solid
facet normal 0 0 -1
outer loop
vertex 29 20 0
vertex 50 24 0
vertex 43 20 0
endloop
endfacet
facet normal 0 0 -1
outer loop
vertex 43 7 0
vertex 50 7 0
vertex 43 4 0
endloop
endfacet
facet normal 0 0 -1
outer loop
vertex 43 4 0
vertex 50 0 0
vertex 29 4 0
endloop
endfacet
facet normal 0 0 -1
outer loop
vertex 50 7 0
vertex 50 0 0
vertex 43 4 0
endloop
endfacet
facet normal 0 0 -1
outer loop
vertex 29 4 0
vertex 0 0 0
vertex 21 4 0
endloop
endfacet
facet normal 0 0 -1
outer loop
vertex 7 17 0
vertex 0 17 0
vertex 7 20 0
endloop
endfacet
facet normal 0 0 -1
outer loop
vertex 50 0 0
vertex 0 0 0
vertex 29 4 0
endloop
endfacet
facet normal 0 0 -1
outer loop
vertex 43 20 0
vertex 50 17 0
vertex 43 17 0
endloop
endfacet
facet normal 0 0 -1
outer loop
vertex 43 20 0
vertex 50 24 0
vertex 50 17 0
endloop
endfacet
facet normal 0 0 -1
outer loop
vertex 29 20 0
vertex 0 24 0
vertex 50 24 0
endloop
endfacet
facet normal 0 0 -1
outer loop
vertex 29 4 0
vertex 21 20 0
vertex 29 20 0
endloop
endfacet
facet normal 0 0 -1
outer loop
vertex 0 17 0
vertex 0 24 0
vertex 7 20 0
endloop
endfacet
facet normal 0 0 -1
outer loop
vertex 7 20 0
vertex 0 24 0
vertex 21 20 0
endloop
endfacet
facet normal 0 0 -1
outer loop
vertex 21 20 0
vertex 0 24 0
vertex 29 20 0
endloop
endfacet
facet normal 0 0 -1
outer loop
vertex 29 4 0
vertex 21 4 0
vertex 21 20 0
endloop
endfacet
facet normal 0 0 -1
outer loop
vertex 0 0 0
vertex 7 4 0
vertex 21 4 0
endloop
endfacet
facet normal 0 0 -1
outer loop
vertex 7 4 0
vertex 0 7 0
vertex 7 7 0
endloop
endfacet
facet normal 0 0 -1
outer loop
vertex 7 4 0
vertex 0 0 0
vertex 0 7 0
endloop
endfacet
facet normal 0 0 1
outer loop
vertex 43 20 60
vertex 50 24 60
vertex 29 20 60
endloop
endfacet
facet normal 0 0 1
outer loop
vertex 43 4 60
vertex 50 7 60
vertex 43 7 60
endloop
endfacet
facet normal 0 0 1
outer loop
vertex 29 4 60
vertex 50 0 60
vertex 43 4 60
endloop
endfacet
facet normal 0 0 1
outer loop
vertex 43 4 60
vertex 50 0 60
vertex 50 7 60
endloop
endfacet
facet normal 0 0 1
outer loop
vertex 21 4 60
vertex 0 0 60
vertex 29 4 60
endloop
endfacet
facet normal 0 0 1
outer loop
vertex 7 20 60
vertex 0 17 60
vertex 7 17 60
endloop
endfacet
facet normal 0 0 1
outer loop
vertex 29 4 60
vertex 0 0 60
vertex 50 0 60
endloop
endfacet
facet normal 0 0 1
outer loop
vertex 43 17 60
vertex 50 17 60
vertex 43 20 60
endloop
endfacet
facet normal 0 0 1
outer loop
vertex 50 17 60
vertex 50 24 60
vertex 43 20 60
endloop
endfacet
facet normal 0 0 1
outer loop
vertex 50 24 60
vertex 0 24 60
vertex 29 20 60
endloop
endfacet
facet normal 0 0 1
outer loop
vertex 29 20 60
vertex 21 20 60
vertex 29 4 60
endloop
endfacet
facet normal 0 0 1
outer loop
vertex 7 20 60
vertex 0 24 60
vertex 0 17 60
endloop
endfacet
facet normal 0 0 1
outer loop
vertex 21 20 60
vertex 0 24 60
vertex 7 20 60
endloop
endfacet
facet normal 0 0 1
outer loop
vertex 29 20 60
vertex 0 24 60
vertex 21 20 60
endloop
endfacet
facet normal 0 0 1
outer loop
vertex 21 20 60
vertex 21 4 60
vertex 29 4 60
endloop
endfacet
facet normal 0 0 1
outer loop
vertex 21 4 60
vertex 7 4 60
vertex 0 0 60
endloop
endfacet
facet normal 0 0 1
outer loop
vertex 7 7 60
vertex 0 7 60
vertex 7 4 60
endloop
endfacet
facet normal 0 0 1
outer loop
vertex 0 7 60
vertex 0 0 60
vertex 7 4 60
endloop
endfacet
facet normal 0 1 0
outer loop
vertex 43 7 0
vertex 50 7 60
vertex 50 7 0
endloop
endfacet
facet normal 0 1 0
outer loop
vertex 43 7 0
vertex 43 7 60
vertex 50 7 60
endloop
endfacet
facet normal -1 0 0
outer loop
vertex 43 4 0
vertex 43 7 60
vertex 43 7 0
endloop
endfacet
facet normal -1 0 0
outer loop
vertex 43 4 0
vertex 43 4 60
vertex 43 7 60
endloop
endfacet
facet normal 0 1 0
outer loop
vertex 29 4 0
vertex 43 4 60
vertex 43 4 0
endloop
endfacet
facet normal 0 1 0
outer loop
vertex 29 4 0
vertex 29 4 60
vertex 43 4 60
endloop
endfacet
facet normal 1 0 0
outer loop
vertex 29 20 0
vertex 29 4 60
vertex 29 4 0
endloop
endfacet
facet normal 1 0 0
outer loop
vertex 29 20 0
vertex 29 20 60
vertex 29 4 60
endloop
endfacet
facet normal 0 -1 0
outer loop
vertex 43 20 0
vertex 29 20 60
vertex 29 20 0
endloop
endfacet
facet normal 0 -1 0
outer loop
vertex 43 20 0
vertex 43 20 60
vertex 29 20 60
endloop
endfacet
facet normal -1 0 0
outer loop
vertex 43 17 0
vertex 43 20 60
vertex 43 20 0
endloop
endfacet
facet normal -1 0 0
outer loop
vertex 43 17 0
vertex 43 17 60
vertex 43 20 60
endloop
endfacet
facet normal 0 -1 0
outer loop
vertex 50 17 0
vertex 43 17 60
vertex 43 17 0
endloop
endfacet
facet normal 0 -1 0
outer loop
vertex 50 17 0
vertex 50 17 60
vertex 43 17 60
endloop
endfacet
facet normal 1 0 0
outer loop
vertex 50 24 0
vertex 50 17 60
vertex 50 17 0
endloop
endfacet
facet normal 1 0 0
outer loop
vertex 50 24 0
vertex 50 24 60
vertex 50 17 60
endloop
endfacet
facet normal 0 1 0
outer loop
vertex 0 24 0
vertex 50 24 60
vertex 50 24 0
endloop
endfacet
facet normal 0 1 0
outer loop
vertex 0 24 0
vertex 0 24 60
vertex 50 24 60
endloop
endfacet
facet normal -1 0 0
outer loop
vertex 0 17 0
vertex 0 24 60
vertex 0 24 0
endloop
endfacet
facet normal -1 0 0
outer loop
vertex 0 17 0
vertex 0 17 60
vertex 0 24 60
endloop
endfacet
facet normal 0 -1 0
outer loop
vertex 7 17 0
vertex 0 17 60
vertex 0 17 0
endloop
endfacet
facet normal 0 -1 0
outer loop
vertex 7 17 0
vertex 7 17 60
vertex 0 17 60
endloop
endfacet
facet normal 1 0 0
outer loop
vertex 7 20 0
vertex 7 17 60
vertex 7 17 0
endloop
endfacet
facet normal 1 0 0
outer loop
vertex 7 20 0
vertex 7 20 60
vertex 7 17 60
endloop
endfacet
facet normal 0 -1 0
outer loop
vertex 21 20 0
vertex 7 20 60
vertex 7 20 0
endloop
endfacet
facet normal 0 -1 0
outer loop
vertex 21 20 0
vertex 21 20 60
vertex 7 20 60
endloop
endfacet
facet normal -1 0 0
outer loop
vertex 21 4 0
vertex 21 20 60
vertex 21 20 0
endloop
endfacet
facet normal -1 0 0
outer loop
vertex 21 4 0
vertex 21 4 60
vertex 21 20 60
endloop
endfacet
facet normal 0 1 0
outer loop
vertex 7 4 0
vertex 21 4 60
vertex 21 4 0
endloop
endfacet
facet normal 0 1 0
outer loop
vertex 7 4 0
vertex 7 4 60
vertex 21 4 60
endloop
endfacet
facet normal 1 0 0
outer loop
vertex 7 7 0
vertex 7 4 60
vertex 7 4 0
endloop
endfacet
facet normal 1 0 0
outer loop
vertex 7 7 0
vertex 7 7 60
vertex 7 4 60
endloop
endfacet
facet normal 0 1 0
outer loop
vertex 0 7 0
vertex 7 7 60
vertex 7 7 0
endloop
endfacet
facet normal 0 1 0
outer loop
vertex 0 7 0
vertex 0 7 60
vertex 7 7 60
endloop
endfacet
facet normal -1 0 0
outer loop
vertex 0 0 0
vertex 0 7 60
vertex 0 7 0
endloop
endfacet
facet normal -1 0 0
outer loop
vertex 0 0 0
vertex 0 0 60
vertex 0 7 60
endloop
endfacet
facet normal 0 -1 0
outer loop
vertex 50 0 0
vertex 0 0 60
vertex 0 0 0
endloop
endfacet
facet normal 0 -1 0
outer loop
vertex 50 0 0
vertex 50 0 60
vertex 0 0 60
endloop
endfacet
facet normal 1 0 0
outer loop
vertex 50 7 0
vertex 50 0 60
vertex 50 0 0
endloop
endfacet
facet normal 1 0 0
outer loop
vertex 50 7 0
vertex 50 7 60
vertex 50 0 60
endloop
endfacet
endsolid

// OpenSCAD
$fn = 32;

// ----------------------------------------------------------------------
// T-slot rail: 50 x 24 mm section, 60 mm long
// ----------------------------------------------------------------------

// --- parameters (mm) ---
profile_height = 60;      // extrusion height
profile_points = 20;      // points of the closed outline

profile = [[0, 0], [50, 0], [50, 7], [43, 7], [43, 4], [29, 4], [29, 20], [43, 20], [43, 17], [50, 17], [50, 24], [0, 24], [0, 17], [7, 17], [7, 20], [21, 20], [21, 4], [7, 4], [7, 7], [0, 7]];  // single closed polygon, 20 points, counter clockwise

// --- the one profile operation ---
linear_extrude(height = profile_height) polygon(points = profile);
